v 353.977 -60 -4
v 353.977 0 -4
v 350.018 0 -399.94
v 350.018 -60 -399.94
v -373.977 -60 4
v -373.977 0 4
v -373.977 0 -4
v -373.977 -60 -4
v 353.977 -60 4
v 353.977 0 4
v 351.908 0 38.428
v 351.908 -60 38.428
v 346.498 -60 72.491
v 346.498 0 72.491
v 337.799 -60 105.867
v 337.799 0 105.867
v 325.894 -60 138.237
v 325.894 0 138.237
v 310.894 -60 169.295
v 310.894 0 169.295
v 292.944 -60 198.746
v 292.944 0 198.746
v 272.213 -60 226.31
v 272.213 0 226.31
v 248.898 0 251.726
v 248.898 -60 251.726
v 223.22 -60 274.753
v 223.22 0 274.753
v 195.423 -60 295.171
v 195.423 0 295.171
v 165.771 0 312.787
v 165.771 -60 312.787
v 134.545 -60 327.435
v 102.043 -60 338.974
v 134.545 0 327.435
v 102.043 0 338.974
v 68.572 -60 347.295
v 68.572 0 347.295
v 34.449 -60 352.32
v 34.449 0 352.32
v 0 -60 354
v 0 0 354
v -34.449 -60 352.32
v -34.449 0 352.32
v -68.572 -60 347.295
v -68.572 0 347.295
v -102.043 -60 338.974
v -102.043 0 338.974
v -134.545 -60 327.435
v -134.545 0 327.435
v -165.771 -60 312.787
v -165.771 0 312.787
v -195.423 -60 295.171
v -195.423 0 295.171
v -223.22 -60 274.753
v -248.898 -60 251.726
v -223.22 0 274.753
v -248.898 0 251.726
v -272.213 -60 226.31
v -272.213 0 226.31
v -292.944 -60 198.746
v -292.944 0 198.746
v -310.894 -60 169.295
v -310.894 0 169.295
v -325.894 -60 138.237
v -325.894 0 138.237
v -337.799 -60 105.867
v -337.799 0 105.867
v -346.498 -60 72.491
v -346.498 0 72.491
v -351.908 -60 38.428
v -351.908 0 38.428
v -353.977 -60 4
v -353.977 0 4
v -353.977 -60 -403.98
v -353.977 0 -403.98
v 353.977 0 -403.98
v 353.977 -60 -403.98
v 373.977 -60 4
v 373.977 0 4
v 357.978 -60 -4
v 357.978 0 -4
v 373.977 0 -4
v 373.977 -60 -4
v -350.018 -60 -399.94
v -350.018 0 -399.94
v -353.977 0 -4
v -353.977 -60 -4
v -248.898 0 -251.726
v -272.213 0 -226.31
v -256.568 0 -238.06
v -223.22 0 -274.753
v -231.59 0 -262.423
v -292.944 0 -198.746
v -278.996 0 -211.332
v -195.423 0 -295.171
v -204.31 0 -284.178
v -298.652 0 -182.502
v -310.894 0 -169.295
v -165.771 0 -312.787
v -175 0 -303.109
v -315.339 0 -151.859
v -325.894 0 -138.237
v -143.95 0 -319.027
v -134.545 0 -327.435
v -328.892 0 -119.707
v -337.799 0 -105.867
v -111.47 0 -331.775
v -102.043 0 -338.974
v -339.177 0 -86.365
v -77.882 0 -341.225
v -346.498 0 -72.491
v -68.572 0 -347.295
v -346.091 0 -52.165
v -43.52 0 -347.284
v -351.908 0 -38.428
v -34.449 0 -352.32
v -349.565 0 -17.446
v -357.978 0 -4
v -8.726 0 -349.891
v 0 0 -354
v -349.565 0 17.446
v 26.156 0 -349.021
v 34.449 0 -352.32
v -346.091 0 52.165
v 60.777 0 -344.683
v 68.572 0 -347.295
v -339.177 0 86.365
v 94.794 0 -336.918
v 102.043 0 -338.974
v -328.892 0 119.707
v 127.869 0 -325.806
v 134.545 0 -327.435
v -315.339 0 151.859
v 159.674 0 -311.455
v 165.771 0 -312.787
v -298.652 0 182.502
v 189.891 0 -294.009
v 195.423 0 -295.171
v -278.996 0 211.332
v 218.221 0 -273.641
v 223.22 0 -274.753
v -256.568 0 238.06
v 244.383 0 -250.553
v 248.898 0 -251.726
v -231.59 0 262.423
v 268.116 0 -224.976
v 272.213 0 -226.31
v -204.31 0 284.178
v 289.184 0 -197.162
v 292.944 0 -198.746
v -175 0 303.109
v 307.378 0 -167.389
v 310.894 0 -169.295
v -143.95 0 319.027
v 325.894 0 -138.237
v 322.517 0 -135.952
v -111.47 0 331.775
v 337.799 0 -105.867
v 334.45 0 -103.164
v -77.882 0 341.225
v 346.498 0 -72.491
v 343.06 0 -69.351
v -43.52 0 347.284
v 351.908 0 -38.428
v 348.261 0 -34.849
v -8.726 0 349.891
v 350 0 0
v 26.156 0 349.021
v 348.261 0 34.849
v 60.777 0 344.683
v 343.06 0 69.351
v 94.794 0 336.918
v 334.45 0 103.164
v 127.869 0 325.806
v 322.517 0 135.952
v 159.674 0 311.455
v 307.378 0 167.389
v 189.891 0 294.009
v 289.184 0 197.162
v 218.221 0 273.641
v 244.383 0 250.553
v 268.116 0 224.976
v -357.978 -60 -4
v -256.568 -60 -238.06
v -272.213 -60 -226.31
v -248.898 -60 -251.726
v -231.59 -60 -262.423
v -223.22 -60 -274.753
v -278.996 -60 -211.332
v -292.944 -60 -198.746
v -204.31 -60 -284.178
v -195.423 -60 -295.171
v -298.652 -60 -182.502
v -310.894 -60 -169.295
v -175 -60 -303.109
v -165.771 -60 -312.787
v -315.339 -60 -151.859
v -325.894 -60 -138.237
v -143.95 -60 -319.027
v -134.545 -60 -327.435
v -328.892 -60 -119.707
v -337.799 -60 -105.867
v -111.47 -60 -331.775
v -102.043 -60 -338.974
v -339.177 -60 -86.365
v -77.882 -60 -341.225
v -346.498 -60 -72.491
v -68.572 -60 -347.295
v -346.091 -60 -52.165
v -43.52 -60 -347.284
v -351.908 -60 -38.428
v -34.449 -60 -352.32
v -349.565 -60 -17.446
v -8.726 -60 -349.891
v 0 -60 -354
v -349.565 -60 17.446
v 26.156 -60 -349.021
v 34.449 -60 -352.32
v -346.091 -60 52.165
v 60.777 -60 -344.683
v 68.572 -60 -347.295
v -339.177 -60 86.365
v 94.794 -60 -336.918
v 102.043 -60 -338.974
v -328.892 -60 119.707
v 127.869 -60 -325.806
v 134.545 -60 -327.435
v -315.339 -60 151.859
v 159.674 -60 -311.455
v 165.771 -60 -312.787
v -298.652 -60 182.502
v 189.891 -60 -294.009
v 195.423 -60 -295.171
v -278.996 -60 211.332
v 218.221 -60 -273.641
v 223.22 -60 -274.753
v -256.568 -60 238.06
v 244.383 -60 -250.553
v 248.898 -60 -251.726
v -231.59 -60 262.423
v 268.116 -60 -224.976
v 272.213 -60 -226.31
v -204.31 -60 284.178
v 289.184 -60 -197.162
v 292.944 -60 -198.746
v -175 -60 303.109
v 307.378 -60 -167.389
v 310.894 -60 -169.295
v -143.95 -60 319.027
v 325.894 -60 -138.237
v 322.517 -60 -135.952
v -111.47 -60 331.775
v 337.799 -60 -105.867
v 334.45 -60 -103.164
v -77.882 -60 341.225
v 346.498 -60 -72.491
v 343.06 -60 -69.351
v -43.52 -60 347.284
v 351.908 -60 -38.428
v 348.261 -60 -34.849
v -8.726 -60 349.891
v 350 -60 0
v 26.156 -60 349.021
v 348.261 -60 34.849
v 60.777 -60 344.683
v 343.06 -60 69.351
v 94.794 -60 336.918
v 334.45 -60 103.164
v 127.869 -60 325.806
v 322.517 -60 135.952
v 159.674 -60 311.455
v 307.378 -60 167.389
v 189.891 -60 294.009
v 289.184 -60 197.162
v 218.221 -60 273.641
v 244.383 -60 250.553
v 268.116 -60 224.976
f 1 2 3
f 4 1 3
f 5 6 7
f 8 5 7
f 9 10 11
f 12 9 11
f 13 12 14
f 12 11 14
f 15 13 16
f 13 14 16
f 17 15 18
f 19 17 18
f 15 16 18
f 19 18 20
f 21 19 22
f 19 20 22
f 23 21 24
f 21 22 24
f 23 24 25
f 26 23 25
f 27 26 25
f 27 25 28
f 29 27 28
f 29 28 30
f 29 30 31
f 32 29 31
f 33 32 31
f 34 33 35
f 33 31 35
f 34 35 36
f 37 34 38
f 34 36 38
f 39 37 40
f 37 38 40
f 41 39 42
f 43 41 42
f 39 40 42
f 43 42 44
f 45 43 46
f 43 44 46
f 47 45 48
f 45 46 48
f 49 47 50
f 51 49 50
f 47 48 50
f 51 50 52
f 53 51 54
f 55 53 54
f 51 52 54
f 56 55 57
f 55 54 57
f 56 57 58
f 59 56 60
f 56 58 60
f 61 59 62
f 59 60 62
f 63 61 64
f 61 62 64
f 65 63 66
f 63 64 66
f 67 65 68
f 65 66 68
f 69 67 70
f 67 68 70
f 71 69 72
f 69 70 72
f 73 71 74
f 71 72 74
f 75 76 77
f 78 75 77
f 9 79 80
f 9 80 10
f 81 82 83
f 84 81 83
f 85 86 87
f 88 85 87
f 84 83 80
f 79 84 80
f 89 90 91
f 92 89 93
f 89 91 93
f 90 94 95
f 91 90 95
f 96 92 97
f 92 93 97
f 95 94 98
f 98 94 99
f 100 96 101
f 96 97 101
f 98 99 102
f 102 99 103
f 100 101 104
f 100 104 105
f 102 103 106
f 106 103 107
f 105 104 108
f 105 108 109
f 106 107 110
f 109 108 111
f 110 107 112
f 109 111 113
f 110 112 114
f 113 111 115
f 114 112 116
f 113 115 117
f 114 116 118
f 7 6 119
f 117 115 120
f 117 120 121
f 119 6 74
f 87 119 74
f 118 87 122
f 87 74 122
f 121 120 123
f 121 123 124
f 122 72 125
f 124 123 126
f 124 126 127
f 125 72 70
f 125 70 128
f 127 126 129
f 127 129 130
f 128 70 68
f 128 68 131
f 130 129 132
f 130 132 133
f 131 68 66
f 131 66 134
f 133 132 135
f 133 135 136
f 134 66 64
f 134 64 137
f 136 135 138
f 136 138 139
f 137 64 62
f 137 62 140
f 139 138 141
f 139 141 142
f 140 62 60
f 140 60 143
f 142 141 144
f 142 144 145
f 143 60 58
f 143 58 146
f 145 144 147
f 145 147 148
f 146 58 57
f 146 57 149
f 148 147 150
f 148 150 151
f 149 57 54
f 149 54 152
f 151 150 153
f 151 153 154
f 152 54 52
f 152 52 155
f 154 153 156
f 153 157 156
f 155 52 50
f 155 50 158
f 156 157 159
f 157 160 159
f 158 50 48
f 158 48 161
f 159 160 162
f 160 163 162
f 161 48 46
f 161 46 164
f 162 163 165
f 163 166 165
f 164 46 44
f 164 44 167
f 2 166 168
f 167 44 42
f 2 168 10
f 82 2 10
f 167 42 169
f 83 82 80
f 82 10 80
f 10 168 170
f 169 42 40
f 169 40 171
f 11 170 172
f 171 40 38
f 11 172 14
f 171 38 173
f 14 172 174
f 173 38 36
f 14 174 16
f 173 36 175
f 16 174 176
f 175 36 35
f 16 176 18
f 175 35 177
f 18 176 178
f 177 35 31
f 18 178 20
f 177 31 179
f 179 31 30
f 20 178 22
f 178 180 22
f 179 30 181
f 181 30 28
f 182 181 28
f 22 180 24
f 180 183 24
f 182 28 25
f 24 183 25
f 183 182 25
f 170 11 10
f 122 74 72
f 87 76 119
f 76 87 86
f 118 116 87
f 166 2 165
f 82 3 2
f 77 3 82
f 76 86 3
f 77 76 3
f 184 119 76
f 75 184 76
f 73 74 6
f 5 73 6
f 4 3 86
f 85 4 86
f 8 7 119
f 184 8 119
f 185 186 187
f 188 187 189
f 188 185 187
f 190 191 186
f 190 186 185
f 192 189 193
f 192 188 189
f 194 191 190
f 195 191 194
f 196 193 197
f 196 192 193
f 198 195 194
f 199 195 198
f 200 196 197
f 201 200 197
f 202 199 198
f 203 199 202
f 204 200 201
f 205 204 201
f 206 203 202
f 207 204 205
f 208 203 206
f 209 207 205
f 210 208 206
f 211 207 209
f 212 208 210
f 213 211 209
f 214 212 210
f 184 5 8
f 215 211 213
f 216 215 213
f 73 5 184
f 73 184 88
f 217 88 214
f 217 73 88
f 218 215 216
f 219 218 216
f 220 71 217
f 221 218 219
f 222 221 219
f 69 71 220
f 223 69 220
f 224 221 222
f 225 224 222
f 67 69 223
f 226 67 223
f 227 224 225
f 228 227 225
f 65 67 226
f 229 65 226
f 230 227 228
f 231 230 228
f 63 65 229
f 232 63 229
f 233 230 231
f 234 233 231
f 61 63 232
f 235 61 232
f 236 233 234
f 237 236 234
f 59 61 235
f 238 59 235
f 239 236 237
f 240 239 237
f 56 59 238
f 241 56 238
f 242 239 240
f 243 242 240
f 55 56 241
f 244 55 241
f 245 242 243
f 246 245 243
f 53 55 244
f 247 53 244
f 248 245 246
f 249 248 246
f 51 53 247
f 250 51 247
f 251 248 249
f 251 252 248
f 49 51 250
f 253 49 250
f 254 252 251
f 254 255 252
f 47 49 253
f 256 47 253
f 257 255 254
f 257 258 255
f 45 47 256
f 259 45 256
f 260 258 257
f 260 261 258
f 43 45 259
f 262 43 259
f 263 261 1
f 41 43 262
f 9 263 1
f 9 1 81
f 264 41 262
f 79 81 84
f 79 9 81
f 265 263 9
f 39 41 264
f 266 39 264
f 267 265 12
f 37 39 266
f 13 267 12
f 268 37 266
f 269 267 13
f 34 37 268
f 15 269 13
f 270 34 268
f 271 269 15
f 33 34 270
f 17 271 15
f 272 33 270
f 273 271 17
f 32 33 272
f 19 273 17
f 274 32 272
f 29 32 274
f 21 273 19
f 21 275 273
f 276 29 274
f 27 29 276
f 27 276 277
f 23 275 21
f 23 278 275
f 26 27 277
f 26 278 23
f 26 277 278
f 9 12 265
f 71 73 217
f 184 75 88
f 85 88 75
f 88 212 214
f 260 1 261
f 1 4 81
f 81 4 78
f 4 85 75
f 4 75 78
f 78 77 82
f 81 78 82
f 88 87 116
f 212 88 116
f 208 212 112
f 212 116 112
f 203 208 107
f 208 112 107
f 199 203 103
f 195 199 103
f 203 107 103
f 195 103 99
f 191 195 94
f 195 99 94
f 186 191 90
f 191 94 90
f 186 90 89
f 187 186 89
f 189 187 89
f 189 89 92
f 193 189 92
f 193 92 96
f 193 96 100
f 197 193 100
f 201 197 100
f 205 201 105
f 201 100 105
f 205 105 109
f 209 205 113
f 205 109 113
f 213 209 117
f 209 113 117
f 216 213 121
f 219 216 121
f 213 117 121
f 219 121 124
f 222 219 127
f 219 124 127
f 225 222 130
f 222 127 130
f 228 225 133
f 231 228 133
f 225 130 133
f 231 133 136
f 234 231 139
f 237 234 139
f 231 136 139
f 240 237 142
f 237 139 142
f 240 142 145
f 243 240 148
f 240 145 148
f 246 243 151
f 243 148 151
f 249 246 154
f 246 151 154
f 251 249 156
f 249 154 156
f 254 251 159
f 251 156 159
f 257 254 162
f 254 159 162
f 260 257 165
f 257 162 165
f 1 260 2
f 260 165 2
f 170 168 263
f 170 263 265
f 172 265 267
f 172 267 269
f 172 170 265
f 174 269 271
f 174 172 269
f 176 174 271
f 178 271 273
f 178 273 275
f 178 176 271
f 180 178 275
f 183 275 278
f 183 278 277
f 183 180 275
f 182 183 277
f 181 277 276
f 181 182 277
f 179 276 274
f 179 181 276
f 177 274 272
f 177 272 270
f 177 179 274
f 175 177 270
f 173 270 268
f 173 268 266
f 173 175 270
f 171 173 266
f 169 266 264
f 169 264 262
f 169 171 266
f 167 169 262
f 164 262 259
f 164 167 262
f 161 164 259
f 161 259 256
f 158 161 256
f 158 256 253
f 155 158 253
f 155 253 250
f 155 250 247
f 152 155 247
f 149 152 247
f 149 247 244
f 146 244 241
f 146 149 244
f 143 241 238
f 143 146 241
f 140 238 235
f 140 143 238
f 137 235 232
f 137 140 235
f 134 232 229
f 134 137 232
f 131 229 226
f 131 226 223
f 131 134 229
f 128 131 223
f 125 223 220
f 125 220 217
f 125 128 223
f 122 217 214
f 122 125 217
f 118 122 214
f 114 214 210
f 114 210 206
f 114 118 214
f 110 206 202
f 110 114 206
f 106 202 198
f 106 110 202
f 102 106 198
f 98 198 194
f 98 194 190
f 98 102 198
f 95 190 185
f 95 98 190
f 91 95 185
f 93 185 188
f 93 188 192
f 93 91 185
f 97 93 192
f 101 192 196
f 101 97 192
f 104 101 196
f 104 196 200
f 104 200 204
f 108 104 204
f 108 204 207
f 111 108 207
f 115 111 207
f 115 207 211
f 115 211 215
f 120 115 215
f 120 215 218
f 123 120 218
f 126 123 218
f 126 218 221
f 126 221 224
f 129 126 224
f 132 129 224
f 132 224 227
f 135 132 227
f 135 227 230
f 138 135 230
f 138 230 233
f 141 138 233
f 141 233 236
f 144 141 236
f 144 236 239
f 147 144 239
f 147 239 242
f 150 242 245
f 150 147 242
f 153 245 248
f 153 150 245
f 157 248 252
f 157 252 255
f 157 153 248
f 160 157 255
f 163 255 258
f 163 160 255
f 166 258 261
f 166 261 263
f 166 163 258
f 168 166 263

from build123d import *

# Parameters (mm, degrees)
F0_R     = 350
F1_DEPTH = 60


with BuildPart() as f1:
    # F0 (on Front) → F1 (new body)
    with BuildSketch(Plane.XZ):
        with BuildLine():
            ThreePointArc((353.9774, -4), (353.99435, -2.000032), (354, 0))
            ThreePointArc((354, 0), (353.99435, 2.000032), (353.9774, 4))
            ThreePointArc((353.9774, 4), (0, 354), (-353.9774, 4))
            ThreePointArc((-353.9774, 4), (-354, 0), (-353.9774, -4))
            ThreePointArc((-353.9774, -4), (0, -354), (353.9774, -4))
        make_face()
        Circle(F0_R, mode=Mode.SUBTRACT)
        with BuildLine():
            ThreePointArc((353.9774, 4), (353.99435, 2.000032), (354, 0))
            ThreePointArc((354, 0), (353.99435, -2.000032), (353.9774, -4))
            Line((353.9774, -4), (357.9776, -4))
            Line((357.9776, -4), (373.9774, -4))
            Line((373.9774, -4), (373.9774, 0))
            Line((373.9774, 0), (373.9774, 4))
            Line((373.9774, 4), (353.9774, 4))
        make_face()
        Polygon((357.9776, -4), (353.9774, -4), (350.017602, -399.940196), (-350.017602, -399.940196), (-353.9774, -4), (-357.9776, -4), (-353.9774, -403.979997), (353.9774, -403.979997), align=None)
        with BuildLine():
            ThreePointArc((-353.9774, -4), (-354, 0), (-353.9774, 4))
            Line((-353.9774, 4), (-373.9774, 4))
            Line((-373.9774, 4), (-373.9774, 0))
            Line((-373.9774, 0), (-373.9774, -4))
            Line((-373.9774, -4), (-357.9776, -4))
            Line((-357.9776, -4), (-353.9774, -4))
        make_face()
    extrude(amount=F1_DEPTH)


solid = f1.part
